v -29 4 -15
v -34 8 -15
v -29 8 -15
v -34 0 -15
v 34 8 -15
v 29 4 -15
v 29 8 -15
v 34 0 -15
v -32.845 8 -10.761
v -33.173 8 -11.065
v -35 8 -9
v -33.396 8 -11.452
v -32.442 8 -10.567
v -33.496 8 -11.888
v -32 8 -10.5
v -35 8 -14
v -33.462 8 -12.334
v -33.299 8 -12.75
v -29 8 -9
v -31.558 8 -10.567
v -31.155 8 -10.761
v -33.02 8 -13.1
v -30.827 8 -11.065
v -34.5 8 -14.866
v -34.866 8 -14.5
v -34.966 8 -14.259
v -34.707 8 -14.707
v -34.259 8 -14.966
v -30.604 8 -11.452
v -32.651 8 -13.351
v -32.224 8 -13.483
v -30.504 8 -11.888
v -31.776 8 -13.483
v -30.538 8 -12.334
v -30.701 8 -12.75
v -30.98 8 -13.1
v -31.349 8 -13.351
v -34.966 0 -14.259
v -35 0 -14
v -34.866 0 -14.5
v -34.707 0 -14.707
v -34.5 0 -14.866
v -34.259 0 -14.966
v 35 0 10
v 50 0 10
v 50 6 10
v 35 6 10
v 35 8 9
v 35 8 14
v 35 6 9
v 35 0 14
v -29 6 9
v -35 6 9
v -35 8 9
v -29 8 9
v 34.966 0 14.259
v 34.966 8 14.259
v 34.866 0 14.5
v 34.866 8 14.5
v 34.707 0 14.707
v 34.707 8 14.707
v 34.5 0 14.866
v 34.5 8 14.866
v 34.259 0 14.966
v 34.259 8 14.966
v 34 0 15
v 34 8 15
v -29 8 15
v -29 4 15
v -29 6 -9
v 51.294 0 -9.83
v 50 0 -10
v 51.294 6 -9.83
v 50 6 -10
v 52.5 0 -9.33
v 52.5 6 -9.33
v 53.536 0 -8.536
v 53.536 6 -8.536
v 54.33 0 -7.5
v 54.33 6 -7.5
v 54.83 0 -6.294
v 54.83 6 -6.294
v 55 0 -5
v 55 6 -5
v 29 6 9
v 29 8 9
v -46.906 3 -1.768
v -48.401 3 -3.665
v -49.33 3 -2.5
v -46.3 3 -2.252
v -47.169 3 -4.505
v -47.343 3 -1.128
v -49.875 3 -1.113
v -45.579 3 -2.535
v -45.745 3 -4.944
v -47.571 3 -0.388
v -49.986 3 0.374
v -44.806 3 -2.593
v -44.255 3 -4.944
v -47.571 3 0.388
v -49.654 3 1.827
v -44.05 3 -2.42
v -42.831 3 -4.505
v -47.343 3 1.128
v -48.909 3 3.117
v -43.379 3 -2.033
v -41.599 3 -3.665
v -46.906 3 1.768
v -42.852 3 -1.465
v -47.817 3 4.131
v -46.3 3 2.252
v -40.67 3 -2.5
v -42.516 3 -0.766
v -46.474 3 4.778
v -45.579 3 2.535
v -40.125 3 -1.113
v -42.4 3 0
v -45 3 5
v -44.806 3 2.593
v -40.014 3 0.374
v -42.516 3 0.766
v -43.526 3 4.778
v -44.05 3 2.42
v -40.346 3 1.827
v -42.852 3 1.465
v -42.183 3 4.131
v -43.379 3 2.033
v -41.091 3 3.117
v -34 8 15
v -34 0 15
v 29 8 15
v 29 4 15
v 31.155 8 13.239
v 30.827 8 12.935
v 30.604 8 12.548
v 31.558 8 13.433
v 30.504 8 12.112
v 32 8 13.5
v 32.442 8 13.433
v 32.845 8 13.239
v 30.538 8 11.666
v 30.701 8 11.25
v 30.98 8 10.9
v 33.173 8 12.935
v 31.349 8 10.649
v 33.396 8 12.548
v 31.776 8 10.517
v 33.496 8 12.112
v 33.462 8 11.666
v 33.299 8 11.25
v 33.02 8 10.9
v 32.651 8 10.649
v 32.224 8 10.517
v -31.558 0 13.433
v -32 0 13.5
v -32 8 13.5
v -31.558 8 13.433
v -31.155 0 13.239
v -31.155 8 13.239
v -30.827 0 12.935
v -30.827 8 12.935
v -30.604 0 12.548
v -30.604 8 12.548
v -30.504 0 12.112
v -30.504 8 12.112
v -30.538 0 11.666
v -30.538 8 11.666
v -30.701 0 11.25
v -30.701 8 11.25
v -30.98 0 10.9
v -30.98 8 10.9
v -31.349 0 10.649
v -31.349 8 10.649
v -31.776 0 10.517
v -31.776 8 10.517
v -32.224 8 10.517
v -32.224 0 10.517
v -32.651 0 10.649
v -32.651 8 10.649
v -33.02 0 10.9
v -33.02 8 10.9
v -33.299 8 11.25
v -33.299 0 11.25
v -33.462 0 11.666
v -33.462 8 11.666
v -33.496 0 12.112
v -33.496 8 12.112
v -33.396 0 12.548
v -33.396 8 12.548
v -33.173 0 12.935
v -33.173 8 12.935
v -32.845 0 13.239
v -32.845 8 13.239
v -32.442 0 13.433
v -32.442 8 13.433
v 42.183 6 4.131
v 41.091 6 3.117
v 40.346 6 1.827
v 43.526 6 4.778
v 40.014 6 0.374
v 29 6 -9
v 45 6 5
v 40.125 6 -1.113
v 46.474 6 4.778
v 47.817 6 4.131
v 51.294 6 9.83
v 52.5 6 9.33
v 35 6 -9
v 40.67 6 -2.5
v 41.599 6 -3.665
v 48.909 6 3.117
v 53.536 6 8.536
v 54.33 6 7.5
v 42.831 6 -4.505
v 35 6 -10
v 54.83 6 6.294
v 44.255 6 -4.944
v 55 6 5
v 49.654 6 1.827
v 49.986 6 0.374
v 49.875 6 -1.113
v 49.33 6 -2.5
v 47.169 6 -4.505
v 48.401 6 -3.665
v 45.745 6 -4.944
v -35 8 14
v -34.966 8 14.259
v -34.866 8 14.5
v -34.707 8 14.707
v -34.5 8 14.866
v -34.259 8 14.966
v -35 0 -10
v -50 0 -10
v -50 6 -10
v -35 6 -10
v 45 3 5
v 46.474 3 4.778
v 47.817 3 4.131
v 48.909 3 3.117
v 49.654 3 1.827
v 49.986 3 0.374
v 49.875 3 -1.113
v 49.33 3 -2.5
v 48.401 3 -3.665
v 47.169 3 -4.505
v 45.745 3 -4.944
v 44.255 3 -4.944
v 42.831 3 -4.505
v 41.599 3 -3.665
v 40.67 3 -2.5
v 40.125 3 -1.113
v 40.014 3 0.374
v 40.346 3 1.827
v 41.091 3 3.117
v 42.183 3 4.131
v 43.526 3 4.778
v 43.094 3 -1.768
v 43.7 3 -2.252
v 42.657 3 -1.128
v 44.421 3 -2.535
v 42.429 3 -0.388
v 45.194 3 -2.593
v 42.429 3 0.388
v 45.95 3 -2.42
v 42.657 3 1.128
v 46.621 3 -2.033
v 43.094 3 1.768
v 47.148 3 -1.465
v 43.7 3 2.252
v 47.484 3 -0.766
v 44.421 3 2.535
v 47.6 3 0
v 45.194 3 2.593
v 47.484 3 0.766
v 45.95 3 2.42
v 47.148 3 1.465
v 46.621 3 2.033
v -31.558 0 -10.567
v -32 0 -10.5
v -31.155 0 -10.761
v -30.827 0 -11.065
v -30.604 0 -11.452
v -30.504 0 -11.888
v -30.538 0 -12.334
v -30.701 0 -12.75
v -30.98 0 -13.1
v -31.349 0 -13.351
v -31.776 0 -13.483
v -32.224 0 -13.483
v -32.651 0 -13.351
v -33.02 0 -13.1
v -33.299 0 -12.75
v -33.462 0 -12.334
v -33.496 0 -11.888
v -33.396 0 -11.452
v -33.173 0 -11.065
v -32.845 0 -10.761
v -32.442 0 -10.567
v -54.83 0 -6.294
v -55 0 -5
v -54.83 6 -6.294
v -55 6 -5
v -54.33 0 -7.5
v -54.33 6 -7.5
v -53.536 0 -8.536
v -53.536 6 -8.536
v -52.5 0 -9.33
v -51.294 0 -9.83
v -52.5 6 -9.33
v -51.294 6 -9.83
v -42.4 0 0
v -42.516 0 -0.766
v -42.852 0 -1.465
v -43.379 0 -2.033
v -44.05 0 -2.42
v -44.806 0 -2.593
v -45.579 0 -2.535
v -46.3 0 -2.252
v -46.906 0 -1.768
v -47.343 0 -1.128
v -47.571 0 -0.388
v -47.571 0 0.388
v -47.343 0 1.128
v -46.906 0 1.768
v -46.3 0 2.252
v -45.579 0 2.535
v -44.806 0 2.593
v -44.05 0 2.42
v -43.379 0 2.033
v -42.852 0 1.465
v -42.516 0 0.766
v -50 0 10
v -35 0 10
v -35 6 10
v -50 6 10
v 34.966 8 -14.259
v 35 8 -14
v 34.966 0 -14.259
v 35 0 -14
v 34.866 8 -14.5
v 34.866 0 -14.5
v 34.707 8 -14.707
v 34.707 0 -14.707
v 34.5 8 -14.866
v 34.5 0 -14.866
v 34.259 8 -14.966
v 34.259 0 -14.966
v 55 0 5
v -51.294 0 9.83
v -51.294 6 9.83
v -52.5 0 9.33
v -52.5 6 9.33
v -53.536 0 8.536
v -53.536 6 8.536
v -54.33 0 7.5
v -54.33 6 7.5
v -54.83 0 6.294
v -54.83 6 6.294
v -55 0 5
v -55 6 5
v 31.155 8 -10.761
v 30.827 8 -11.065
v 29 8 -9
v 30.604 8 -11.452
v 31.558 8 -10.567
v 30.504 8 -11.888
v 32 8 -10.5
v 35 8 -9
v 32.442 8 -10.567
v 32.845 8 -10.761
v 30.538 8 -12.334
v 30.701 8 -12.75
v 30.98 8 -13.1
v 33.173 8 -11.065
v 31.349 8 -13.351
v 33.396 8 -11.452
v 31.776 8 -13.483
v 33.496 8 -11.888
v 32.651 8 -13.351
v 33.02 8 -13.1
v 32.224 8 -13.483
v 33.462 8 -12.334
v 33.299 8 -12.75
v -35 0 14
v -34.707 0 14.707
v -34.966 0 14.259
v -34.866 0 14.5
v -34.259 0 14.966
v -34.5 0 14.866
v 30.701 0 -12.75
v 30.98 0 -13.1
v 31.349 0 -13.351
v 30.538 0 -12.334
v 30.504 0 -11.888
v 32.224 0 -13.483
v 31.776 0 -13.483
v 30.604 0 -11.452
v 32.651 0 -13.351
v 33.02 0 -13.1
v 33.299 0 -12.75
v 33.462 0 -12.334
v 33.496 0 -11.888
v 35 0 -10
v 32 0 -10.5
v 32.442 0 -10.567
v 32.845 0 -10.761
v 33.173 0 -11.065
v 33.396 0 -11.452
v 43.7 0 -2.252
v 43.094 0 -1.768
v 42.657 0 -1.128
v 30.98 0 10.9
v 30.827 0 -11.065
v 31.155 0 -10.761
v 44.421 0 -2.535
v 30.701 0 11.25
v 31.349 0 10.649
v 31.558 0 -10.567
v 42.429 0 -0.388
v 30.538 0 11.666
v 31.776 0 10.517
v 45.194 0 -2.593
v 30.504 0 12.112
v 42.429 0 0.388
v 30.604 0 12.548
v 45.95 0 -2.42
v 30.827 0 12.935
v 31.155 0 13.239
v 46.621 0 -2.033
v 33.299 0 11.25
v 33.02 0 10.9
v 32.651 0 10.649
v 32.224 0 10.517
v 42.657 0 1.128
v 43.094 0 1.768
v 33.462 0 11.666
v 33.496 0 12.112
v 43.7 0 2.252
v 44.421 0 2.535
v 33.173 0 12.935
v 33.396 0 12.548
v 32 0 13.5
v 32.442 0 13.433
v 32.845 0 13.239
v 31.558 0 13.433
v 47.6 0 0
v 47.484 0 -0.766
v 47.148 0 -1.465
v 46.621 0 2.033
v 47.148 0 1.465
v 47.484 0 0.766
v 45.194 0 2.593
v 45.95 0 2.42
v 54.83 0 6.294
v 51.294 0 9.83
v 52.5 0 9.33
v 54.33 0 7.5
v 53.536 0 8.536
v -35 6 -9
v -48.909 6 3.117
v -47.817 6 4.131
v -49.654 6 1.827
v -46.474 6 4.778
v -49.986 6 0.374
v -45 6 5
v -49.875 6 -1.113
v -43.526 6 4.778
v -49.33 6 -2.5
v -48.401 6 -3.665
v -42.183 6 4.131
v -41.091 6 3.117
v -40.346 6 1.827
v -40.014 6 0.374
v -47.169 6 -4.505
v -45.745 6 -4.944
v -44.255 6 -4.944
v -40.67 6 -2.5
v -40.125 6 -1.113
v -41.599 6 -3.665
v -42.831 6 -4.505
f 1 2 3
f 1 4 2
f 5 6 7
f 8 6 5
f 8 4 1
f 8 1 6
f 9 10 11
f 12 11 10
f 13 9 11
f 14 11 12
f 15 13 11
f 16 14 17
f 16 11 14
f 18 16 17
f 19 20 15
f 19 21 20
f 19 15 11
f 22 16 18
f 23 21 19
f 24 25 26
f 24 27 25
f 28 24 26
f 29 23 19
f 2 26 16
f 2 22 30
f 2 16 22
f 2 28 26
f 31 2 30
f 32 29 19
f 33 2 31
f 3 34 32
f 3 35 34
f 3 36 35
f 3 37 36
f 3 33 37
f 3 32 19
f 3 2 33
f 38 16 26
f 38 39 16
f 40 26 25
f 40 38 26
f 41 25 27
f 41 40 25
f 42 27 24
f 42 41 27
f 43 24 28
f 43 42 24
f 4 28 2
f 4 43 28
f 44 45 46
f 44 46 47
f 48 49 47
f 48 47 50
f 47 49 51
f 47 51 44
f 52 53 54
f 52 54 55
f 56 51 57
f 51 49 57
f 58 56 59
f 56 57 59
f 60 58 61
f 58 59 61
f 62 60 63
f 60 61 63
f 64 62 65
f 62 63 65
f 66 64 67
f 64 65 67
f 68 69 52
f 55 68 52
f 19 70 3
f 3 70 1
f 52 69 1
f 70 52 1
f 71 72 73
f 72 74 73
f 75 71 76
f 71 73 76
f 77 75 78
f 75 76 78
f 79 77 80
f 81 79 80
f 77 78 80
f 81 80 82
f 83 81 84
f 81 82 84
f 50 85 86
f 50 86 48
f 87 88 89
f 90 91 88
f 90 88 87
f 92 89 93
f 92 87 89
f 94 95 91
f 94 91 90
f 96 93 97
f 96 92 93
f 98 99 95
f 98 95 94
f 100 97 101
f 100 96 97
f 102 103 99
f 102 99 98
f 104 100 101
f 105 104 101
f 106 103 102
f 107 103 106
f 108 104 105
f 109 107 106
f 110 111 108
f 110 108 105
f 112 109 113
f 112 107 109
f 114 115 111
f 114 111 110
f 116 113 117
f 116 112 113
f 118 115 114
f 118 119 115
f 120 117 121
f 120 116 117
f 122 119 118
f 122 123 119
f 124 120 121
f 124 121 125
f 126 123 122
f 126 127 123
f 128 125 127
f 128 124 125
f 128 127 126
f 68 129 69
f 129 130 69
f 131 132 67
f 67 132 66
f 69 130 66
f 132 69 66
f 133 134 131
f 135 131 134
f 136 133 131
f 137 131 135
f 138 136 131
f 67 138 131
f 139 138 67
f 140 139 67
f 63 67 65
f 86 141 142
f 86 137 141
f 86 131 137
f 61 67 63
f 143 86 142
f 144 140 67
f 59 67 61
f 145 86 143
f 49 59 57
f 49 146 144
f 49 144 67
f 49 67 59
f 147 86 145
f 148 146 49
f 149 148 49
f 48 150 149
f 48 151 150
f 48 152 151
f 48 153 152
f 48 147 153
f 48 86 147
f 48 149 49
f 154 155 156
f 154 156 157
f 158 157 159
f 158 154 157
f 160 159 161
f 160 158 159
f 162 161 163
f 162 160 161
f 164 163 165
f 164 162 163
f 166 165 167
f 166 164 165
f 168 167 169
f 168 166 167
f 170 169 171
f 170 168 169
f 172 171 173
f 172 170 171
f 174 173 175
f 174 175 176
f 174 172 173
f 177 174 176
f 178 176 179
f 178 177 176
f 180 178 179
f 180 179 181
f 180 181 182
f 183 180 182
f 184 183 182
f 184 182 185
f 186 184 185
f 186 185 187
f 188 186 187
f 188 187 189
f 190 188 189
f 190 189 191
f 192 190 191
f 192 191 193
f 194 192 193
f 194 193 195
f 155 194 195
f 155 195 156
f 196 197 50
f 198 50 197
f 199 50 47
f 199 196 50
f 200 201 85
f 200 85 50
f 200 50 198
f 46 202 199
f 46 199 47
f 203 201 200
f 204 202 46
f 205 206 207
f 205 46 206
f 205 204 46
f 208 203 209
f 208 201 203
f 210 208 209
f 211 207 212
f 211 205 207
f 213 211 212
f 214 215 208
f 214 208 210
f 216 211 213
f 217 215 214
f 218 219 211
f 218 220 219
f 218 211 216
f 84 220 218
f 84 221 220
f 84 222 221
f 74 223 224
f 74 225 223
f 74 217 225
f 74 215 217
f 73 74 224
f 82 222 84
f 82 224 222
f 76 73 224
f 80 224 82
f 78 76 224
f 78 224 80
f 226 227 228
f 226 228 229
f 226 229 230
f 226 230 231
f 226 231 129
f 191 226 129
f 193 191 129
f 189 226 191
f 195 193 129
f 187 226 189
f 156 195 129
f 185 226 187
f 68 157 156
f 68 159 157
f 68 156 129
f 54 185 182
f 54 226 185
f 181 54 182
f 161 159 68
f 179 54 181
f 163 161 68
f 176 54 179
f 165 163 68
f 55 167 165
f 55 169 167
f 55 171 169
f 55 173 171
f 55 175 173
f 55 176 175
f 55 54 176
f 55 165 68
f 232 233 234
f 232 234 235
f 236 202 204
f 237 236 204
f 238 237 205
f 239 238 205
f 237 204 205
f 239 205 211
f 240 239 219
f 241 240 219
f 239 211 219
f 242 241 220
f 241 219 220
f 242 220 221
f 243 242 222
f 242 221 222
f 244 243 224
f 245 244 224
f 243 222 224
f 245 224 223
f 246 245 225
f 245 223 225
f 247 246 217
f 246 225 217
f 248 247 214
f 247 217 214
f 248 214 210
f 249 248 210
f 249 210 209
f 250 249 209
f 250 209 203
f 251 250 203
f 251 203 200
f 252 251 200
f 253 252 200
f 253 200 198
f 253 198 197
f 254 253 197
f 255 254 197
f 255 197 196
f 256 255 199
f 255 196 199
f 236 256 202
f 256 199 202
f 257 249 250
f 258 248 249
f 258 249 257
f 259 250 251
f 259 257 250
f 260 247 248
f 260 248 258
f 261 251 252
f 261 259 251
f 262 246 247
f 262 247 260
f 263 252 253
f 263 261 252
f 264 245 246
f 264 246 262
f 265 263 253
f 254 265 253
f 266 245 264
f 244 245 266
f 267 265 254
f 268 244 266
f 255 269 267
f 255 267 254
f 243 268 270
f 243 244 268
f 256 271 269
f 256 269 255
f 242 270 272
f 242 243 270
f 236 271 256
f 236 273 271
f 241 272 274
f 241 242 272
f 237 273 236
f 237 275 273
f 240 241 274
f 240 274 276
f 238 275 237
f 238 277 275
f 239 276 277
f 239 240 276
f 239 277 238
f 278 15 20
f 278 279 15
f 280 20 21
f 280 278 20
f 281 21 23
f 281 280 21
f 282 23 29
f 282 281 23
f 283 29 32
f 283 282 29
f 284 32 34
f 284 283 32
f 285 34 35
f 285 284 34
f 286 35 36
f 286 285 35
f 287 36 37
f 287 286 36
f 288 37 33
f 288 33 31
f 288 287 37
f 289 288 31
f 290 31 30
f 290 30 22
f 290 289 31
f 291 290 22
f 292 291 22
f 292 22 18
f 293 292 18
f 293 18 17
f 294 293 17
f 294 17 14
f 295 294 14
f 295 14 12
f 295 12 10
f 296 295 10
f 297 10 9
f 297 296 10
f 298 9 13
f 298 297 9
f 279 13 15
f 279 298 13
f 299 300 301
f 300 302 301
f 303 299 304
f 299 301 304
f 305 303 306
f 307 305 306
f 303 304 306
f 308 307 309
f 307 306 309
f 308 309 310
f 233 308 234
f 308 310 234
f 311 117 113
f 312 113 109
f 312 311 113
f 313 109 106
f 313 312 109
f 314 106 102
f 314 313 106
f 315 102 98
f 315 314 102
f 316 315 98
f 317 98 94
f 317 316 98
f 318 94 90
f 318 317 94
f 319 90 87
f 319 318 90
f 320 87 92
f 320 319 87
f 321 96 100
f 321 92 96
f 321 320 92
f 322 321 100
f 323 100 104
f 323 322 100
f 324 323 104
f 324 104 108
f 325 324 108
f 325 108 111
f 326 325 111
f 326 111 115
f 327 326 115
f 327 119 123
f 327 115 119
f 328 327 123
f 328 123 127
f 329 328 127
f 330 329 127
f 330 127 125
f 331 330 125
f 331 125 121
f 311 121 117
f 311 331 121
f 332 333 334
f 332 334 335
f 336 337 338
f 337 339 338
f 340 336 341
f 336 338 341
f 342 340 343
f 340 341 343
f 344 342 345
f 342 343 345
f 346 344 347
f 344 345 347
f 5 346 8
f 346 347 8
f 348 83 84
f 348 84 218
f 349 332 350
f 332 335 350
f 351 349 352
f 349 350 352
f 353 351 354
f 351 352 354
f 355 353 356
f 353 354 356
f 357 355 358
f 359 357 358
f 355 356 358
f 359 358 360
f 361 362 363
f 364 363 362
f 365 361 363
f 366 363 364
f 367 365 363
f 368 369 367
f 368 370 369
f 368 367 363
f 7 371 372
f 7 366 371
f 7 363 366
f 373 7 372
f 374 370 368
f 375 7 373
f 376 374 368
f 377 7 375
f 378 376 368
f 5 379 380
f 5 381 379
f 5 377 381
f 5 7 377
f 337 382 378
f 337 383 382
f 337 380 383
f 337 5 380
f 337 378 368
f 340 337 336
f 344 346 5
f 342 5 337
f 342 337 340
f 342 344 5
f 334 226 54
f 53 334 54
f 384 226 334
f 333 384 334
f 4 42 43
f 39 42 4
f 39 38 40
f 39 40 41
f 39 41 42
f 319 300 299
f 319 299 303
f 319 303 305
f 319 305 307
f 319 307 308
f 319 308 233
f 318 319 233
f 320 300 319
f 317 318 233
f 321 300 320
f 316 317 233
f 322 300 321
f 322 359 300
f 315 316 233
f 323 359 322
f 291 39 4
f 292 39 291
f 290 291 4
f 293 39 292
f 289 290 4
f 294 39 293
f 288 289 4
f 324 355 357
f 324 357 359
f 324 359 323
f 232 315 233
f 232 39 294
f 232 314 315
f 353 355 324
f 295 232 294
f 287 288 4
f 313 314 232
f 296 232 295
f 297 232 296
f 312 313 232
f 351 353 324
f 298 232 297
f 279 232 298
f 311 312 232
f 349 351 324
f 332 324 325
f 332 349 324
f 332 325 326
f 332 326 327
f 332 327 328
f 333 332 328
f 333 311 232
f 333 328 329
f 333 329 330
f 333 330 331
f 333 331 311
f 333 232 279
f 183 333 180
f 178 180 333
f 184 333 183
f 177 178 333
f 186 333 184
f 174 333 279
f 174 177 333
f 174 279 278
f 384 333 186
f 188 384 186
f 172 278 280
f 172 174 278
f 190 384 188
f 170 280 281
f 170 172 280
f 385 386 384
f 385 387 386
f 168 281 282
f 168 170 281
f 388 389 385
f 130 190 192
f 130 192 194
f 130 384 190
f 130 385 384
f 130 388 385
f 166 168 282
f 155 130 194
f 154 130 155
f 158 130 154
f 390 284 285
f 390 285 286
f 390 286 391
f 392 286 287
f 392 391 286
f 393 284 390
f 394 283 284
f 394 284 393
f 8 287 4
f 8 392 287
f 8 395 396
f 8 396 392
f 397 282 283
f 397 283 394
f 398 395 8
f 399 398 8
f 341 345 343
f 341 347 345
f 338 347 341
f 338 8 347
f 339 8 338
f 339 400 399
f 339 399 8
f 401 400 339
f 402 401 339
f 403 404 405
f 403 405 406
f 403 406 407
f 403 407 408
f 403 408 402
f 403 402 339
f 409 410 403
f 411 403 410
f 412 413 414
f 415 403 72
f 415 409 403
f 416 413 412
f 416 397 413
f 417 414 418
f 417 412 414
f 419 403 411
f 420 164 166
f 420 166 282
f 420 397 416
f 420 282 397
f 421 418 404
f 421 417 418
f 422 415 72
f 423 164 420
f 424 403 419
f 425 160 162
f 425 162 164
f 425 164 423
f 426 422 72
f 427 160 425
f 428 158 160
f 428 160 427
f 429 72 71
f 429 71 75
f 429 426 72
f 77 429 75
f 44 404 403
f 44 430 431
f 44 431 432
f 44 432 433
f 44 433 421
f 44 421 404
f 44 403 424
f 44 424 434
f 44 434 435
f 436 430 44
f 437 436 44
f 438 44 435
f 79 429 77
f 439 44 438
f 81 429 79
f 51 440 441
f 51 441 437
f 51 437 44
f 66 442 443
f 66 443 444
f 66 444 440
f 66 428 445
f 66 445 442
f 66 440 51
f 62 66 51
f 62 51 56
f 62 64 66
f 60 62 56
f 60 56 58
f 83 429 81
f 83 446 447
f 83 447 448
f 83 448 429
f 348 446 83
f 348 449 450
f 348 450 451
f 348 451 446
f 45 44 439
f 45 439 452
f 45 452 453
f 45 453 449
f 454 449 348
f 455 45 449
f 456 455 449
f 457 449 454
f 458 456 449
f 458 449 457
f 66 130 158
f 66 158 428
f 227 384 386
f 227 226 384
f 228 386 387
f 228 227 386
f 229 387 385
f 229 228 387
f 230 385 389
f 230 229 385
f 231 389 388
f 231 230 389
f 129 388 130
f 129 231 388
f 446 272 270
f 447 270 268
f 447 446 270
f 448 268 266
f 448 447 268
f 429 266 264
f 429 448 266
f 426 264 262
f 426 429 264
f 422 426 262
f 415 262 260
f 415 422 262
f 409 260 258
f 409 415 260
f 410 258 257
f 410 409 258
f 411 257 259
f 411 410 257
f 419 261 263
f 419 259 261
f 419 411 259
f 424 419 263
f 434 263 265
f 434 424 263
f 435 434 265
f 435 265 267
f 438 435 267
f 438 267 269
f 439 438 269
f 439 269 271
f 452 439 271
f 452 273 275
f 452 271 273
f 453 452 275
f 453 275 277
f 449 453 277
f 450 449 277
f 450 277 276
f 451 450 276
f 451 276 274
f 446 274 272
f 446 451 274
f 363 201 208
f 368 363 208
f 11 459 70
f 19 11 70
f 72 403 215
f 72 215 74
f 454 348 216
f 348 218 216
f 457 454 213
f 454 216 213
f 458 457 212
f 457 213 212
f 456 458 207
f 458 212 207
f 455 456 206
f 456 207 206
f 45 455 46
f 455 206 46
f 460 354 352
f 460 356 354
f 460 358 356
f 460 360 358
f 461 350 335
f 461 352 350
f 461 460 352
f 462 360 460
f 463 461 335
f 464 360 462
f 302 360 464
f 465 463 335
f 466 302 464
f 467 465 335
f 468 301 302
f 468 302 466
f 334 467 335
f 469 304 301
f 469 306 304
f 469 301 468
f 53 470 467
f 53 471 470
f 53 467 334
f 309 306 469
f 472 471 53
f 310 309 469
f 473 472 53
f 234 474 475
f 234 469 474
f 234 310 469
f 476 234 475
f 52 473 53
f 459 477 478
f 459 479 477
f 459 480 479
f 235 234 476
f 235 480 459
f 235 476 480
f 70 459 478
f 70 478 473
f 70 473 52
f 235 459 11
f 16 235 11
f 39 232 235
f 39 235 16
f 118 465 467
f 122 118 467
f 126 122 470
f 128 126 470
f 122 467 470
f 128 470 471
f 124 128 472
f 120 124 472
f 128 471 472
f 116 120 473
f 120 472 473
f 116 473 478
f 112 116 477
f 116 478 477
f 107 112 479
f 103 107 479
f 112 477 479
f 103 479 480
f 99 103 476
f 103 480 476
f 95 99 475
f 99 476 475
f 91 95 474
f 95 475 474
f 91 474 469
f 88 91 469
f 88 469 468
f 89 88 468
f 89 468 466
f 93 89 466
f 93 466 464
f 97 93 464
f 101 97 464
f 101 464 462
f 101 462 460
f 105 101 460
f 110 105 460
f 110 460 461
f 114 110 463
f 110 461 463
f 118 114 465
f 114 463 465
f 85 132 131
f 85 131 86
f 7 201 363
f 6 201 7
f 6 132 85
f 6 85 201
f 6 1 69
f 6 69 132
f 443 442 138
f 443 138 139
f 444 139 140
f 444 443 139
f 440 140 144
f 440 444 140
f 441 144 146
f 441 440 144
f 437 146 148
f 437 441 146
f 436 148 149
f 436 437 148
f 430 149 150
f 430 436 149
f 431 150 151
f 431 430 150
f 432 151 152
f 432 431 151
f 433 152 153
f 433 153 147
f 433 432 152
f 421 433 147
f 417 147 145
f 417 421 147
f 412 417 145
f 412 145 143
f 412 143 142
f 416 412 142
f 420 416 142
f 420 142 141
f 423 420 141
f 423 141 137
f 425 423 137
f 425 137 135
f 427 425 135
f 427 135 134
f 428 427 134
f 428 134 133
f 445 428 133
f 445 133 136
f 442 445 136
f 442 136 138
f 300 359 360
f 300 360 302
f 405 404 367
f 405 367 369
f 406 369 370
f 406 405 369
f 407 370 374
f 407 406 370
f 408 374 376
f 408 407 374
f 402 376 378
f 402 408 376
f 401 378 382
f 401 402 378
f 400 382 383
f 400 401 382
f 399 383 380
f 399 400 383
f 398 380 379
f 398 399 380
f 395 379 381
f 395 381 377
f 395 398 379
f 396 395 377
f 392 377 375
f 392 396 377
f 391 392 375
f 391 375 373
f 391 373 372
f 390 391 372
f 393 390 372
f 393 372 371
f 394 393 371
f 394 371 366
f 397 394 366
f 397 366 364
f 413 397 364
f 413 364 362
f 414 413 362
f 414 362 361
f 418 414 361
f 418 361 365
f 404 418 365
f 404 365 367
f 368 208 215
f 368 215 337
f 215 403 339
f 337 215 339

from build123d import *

# Parameters (mm, degrees)
SKETCH_25_W          = 70
SKETCH_25_H          = 30
SKETCH_25_R          = 1.5
EXTRUDE_9_DEPTH      = 4
SKETCH_26_W          = 6
SKETCH_26_H          = 6
SKETCH_26_R          = 1.5
EXTRUDE_10_DEPTH     = 4
FILLET_3_R           = 1
EXTRUDE_11_DEPTH     = 6
SKETCH_28_W          = 6
SKETCH_28_H          = 18
EXTRUDE_12_DEPTH     = 2
SKETCH_29_R          = 5
CUT_EXTRUDE_15_DEPTH = 3
FILLET_4_R           = 5


with BuildPart() as part:
    # 草图25 → 凸台-拉伸9 (new body)
    with BuildSketch(Plane(origin=(0, 0, 0), x_dir=(1, 0, 0), z_dir=(0, 1, 0))):
        Rectangle(SKETCH_25_W, SKETCH_25_H)
        with Locations(Location((-32, 12, 0), (0, 0, 270))):
            Circle(SKETCH_25_R, mode=Mode.SUBTRACT)
        with Locations(Location((32, 12, 0), (0, 0, 270))):
            Circle(SKETCH_25_R, mode=Mode.SUBTRACT)
        with Locations(Location((32, -12, 0), (0, 0, 270))):
            Circle(SKETCH_25_R, mode=Mode.SUBTRACT)
        with Locations(Location((-32, -12, 0), (0, 0, 270))):
            Circle(SKETCH_25_R, mode=Mode.SUBTRACT)
    extrude(amount=EXTRUDE_9_DEPTH)

    # 草图26 → 凸台-拉伸10 (add)
    # profile 1 of 4: a face of its own
    with BuildSketch(Plane(origin=(0, 4, 0), x_dir=(1, 0, 0), z_dir=(0, 1, 0))):
        with Locations((-32, 12)):
            Rectangle(SKETCH_26_W, SKETCH_26_H)
        with Locations(Location((-32, 12, 0), (0, 0, 270))):
            Circle(SKETCH_26_R, mode=Mode.SUBTRACT)
    # profile 2 of 4: a face of its own
    with BuildSketch(Plane(origin=(0, 4, 0), x_dir=(1, 0, 0), z_dir=(0, 1, 0))):
        with Locations((-32, -12)):
            Rectangle(SKETCH_26_W, SKETCH_26_H)
        with Locations(Location((-32, -12, 0), (0, 0, 270))):
            Circle(SKETCH_26_R, mode=Mode.SUBTRACT)
    # profile 3 of 4: a face of its own
    with BuildSketch(Plane(origin=(0, 4, 0), x_dir=(1, 0, 0), z_dir=(0, 1, 0))):
        with Locations((32, -12)):
            Rectangle(SKETCH_26_W, SKETCH_26_H)
        with Locations(Location((32, -12, 0), (0, 0, 270))):
            Circle(SKETCH_26_R, mode=Mode.SUBTRACT)
    # profile 4 of 4: a face of its own
    with BuildSketch(Plane(origin=(0, 4, 0), x_dir=(1, 0, 0), z_dir=(0, 1, 0))):
        with Locations((32, 12)):
            Rectangle(SKETCH_26_W, SKETCH_26_H)
        with Locations(Location((32, 12, 0), (0, 0, 270))):
            Circle(SKETCH_26_R, mode=Mode.SUBTRACT)
    extrude(amount=EXTRUDE_10_DEPTH)

    # 圆角3
    fillet_3_edges = [part.edges().sort_by_distance(p)[0] for p in [
        (-35, 4, -15),
        (35, 4, -15),
        (35, 4, 15),
        (-35, 4, 15),
    ]]
    fillet(fillet_3_edges, radius=FILLET_3_R)

    # 草图27 → 凸台-拉伸11 (add)
    with BuildSketch(Plane.XZ):
        with BuildLine():
            Line((-42.4, 0), (-35, 0))
            Line((-35, 0), (-35, 10))
            Line((-35, 10), (-55, 10))
            Line((-55, 10), (-55, 0))
            Line((-55, 0), (-47.6, 0))
            ThreePointArc((-47.6, 0), (-45, 2.6), (-42.4, 0))
        make_face()
        with BuildLine():
            Line((-35, -10), (-35, 0))
            Line((-35, 0), (-42.4, 0))
            ThreePointArc((-42.4, 0), (-45, -2.6), (-47.6, 0))
            Line((-47.6, 0), (-55, 0))
            Line((-55, 0), (-55, -10))
            Line((-55, -10), (-35, -10))
        make_face()
        with BuildLine():
            ThreePointArc((42.4, 0), (45, 2.6), (47.6, 0))
            Line((47.6, 0), (55, 0))
            Line((55, 0), (55, 10))
            Line((55, 10), (35, 10))
            Line((35, 10), (35, 0))
            Line((35, 0), (42.4, 0))
        make_face()
        with BuildLine():
            Line((55, 0), (47.6, 0))
            ThreePointArc((47.6, 0), (45, -2.6), (42.4, 0))
            Line((42.4, 0), (35, 0))
            Line((35, 0), (35, -10))
            Line((35, -10), (55, -10))
            Line((55, -10), (55, 0))
        make_face()
    extrude(amount=-EXTRUDE_11_DEPTH)

    # 草图28 → 凸台-拉伸12 (add)
    with BuildSketch(Plane(origin=(0, 4, 0), x_dir=(1, 0, 0), z_dir=(0, 1, 0))):
        with Locations((-32, 0)):
            Rectangle(SKETCH_28_W, SKETCH_28_H)
        with Locations((32, 0)):
            Rectangle(SKETCH_28_W, SKETCH_28_H)
    extrude(amount=EXTRUDE_12_DEPTH)

    # 草图29 → 切除-拉伸15 (cut)
    with BuildSketch(Plane(origin=(0, 6, 0), x_dir=(1, 0, 0), z_dir=(0, 1, 0))):
        with Locations(Location((-45, 0, 0), (0, 0, 270))):
            Circle(SKETCH_29_R)
        with Locations(Location((45, 0, 0), (0, 0, 270))):
            Circle(SKETCH_29_R)
    extrude(amount=-CUT_EXTRUDE_15_DEPTH, mode=Mode.SUBTRACT)

    # 圆角4
    fillet_4_edges = [part.edges().sort_by_distance(p)[0] for p in [
        (-55, 3, -10),
        (-55, 3, 10),
        (55, 3, -10),
        (55, 3, 10),
    ]]
    fillet(fillet_4_edges, radius=FILLET_4_R)


solid = part.part
